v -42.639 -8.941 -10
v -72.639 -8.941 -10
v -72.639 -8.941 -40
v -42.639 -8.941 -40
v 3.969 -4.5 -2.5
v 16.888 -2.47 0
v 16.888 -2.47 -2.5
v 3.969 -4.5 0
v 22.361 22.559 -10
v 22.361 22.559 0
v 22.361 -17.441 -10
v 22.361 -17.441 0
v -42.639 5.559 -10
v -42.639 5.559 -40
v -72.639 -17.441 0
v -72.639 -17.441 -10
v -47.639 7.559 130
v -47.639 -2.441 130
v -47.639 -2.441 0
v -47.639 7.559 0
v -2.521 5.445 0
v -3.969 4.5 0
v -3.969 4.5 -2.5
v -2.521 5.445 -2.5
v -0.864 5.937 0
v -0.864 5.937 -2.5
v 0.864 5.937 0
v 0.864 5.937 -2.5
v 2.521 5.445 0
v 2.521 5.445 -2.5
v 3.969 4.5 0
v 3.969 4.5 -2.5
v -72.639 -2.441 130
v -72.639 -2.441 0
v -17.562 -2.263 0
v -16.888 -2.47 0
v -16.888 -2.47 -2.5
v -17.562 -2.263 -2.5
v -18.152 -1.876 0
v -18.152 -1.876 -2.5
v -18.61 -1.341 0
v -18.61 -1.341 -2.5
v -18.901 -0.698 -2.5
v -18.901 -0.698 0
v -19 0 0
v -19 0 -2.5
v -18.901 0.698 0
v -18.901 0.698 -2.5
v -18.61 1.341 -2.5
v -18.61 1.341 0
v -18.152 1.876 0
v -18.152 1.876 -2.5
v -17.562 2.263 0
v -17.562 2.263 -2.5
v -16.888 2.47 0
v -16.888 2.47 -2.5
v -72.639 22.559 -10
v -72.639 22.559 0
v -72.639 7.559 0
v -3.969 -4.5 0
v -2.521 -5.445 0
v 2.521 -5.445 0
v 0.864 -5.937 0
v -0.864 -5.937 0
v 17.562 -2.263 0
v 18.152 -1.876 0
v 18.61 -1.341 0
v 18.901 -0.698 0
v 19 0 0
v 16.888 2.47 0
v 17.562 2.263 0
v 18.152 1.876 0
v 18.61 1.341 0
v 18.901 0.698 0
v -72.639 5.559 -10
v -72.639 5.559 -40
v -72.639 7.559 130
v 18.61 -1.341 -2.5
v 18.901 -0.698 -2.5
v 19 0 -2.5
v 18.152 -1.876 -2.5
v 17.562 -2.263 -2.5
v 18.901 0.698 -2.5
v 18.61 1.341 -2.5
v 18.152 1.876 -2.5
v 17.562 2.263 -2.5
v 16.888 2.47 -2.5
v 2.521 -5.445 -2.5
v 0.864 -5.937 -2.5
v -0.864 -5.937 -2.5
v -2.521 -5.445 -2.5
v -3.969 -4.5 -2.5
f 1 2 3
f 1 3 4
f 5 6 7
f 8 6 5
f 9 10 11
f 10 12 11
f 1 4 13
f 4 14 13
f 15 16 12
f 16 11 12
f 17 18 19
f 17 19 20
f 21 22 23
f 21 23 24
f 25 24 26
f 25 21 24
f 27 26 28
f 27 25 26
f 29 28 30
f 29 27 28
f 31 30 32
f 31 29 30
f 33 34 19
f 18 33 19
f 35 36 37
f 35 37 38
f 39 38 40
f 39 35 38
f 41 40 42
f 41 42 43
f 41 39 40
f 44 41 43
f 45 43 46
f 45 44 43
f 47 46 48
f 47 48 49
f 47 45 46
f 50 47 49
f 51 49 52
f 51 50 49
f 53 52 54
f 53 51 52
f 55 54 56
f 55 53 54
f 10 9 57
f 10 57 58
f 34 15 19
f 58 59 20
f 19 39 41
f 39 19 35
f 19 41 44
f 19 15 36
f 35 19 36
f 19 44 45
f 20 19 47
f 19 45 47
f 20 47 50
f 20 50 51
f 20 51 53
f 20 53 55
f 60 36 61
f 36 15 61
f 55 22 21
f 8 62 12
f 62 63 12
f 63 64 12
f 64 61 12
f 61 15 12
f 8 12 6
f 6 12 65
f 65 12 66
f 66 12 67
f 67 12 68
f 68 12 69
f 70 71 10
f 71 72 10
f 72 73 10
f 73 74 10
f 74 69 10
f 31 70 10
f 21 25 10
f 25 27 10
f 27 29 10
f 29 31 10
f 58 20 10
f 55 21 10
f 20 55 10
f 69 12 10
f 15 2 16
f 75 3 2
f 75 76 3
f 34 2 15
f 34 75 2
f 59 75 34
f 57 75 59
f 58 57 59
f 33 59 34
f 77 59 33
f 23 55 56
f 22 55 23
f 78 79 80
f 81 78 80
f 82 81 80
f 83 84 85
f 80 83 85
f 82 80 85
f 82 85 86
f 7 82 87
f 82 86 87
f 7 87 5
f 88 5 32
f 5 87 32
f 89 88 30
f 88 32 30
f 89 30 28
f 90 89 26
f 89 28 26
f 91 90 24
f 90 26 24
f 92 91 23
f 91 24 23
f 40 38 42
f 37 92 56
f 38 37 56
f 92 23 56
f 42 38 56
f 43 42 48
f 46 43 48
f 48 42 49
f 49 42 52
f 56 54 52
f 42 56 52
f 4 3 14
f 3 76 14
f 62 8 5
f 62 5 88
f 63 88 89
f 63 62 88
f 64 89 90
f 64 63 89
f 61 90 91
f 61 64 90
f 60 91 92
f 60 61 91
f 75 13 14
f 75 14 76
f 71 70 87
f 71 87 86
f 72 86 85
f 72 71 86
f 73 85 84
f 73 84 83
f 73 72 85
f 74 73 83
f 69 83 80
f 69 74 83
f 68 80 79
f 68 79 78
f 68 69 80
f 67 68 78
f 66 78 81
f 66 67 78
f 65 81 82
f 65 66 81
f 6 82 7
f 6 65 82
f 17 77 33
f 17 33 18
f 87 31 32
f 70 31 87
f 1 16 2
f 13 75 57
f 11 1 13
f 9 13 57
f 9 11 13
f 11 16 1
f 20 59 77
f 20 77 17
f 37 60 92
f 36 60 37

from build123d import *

# Parameters (mm, degrees)
SKETCH3_W            = 45
SKETCH3_H            = 15
BOSS_EXTRUDE1_DEPTH  = 10
CUT_EXTRUDE1_DEPTH   = 2.5
SKETCH11_W           = 45
SKETCH11_H           = 10
BOSS_EXTRUDE5_DEPTH  = 10
SKETCH14_W           = 45
SKETCH14_H           = 10
BOSS_EXTRUDE7_DEPTH  = 15
SKETCH20_W           = 10
SKETCH20_H           = 40
BOSS_EXTRUDE10_DEPTH = 50
SKETCH21_W           = 25
SKETCH21_H           = 10
BOSS_EXTRUDE11_DEPTH = 130
SKETCH22_W           = 30
SKETCH22_H           = 6
BOSS_EXTRUDE12_DEPTH = 30
SKETCH23_W           = 30
SKETCH23_H           = 30
BOSS_EXTRUDE13_DEPTH = 8.5


with BuildPart() as part:
    # Sketch3 → Boss-Extrude1 (new body)
    with BuildSketch(Plane.XY):
        with Locations((-0.138845539, 0.05888455)):
            Rectangle(SKETCH3_W, SKETCH3_H)
    extrude(amount=-BOSS_EXTRUDE1_DEPTH)

    # Sketch2 → Cut-Extrude1 (cut)
    with BuildSketch(Plane.XY):
        with BuildLine():
            Line((-16.888114198, 2.469689731), (-3.968626967, 4.5))
            ThreePointArc((-3.968626967, 4.5), (0, 6), (3.968626967, 4.5))
            Line((3.968626967, 4.5), (16.888114198, 2.469689731))
            ThreePointArc((16.888114198, 2.469689731), (19, 0), (16.888114198, -2.469689731))
            Line((16.888114198, -2.469689731), (3.968626967, -4.5))
            ThreePointArc((3.968626967, -4.5), (0, -6), (-3.968626967, -4.5))
            Line((-3.968626967, -4.5), (-16.888114198, -2.469689731))
            ThreePointArc((-16.888114198, -2.469689731), (-19, 0), (-16.888114198, 2.469689731))
        make_face()
    extrude(amount=-CUT_EXTRUDE1_DEPTH, mode=Mode.SUBTRACT)

    # Sketch11 → Boss-Extrude5 (add)
    with BuildSketch(Plane.XZ.offset(7.44111545)):
        with Locations((-0.138845539, -5)):
            Rectangle(SKETCH11_W, SKETCH11_H)
    extrude(amount=BOSS_EXTRUDE5_DEPTH)

    # Sketch14 → Boss-Extrude7 (add)
    with BuildSketch(Plane(origin=(0, 7.55888455, 0), x_dir=(1, 0, 0), z_dir=(0, 1, 0))):
        with Locations((-0.138845539, 5)):
            Rectangle(SKETCH14_W, SKETCH14_H)
    extrude(amount=BOSS_EXTRUDE7_DEPTH)

    # Sketch20 → Boss-Extrude10 (add)
    with BuildSketch(Plane.ZY.offset(22.638845539)):
        with Locations((-5, 2.55888455)):
            Rectangle(SKETCH20_W, SKETCH20_H)
    extrude(amount=BOSS_EXTRUDE10_DEPTH)

    # Sketch21 → Boss-Extrude11 (add)
    with BuildSketch(Plane.XY):
        with Locations((-60.138845539, 2.55888455)):
            Rectangle(SKETCH21_W, SKETCH21_H)
    extrude(amount=BOSS_EXTRUDE11_DEPTH)

    # Sketch22 → Boss-Extrude12 (add)
    with BuildSketch(Plane(origin=(0, 0, -10), x_dir=(-1, 0, 0), z_dir=(0, 0, -1))):
        with Locations((57.638845539, 2.55888455)):
            Rectangle(SKETCH22_W, SKETCH22_H)
    extrude(amount=BOSS_EXTRUDE12_DEPTH)

    # Sketch23 → Boss-Extrude13 (add)
    with BuildSketch(Plane.XZ.offset(0.44111545)):
        with Locations((-57.638845539, -25)):
            Rectangle(SKETCH23_W, SKETCH23_H)
    extrude(amount=BOSS_EXTRUDE13_DEPTH)


solid = part.part
